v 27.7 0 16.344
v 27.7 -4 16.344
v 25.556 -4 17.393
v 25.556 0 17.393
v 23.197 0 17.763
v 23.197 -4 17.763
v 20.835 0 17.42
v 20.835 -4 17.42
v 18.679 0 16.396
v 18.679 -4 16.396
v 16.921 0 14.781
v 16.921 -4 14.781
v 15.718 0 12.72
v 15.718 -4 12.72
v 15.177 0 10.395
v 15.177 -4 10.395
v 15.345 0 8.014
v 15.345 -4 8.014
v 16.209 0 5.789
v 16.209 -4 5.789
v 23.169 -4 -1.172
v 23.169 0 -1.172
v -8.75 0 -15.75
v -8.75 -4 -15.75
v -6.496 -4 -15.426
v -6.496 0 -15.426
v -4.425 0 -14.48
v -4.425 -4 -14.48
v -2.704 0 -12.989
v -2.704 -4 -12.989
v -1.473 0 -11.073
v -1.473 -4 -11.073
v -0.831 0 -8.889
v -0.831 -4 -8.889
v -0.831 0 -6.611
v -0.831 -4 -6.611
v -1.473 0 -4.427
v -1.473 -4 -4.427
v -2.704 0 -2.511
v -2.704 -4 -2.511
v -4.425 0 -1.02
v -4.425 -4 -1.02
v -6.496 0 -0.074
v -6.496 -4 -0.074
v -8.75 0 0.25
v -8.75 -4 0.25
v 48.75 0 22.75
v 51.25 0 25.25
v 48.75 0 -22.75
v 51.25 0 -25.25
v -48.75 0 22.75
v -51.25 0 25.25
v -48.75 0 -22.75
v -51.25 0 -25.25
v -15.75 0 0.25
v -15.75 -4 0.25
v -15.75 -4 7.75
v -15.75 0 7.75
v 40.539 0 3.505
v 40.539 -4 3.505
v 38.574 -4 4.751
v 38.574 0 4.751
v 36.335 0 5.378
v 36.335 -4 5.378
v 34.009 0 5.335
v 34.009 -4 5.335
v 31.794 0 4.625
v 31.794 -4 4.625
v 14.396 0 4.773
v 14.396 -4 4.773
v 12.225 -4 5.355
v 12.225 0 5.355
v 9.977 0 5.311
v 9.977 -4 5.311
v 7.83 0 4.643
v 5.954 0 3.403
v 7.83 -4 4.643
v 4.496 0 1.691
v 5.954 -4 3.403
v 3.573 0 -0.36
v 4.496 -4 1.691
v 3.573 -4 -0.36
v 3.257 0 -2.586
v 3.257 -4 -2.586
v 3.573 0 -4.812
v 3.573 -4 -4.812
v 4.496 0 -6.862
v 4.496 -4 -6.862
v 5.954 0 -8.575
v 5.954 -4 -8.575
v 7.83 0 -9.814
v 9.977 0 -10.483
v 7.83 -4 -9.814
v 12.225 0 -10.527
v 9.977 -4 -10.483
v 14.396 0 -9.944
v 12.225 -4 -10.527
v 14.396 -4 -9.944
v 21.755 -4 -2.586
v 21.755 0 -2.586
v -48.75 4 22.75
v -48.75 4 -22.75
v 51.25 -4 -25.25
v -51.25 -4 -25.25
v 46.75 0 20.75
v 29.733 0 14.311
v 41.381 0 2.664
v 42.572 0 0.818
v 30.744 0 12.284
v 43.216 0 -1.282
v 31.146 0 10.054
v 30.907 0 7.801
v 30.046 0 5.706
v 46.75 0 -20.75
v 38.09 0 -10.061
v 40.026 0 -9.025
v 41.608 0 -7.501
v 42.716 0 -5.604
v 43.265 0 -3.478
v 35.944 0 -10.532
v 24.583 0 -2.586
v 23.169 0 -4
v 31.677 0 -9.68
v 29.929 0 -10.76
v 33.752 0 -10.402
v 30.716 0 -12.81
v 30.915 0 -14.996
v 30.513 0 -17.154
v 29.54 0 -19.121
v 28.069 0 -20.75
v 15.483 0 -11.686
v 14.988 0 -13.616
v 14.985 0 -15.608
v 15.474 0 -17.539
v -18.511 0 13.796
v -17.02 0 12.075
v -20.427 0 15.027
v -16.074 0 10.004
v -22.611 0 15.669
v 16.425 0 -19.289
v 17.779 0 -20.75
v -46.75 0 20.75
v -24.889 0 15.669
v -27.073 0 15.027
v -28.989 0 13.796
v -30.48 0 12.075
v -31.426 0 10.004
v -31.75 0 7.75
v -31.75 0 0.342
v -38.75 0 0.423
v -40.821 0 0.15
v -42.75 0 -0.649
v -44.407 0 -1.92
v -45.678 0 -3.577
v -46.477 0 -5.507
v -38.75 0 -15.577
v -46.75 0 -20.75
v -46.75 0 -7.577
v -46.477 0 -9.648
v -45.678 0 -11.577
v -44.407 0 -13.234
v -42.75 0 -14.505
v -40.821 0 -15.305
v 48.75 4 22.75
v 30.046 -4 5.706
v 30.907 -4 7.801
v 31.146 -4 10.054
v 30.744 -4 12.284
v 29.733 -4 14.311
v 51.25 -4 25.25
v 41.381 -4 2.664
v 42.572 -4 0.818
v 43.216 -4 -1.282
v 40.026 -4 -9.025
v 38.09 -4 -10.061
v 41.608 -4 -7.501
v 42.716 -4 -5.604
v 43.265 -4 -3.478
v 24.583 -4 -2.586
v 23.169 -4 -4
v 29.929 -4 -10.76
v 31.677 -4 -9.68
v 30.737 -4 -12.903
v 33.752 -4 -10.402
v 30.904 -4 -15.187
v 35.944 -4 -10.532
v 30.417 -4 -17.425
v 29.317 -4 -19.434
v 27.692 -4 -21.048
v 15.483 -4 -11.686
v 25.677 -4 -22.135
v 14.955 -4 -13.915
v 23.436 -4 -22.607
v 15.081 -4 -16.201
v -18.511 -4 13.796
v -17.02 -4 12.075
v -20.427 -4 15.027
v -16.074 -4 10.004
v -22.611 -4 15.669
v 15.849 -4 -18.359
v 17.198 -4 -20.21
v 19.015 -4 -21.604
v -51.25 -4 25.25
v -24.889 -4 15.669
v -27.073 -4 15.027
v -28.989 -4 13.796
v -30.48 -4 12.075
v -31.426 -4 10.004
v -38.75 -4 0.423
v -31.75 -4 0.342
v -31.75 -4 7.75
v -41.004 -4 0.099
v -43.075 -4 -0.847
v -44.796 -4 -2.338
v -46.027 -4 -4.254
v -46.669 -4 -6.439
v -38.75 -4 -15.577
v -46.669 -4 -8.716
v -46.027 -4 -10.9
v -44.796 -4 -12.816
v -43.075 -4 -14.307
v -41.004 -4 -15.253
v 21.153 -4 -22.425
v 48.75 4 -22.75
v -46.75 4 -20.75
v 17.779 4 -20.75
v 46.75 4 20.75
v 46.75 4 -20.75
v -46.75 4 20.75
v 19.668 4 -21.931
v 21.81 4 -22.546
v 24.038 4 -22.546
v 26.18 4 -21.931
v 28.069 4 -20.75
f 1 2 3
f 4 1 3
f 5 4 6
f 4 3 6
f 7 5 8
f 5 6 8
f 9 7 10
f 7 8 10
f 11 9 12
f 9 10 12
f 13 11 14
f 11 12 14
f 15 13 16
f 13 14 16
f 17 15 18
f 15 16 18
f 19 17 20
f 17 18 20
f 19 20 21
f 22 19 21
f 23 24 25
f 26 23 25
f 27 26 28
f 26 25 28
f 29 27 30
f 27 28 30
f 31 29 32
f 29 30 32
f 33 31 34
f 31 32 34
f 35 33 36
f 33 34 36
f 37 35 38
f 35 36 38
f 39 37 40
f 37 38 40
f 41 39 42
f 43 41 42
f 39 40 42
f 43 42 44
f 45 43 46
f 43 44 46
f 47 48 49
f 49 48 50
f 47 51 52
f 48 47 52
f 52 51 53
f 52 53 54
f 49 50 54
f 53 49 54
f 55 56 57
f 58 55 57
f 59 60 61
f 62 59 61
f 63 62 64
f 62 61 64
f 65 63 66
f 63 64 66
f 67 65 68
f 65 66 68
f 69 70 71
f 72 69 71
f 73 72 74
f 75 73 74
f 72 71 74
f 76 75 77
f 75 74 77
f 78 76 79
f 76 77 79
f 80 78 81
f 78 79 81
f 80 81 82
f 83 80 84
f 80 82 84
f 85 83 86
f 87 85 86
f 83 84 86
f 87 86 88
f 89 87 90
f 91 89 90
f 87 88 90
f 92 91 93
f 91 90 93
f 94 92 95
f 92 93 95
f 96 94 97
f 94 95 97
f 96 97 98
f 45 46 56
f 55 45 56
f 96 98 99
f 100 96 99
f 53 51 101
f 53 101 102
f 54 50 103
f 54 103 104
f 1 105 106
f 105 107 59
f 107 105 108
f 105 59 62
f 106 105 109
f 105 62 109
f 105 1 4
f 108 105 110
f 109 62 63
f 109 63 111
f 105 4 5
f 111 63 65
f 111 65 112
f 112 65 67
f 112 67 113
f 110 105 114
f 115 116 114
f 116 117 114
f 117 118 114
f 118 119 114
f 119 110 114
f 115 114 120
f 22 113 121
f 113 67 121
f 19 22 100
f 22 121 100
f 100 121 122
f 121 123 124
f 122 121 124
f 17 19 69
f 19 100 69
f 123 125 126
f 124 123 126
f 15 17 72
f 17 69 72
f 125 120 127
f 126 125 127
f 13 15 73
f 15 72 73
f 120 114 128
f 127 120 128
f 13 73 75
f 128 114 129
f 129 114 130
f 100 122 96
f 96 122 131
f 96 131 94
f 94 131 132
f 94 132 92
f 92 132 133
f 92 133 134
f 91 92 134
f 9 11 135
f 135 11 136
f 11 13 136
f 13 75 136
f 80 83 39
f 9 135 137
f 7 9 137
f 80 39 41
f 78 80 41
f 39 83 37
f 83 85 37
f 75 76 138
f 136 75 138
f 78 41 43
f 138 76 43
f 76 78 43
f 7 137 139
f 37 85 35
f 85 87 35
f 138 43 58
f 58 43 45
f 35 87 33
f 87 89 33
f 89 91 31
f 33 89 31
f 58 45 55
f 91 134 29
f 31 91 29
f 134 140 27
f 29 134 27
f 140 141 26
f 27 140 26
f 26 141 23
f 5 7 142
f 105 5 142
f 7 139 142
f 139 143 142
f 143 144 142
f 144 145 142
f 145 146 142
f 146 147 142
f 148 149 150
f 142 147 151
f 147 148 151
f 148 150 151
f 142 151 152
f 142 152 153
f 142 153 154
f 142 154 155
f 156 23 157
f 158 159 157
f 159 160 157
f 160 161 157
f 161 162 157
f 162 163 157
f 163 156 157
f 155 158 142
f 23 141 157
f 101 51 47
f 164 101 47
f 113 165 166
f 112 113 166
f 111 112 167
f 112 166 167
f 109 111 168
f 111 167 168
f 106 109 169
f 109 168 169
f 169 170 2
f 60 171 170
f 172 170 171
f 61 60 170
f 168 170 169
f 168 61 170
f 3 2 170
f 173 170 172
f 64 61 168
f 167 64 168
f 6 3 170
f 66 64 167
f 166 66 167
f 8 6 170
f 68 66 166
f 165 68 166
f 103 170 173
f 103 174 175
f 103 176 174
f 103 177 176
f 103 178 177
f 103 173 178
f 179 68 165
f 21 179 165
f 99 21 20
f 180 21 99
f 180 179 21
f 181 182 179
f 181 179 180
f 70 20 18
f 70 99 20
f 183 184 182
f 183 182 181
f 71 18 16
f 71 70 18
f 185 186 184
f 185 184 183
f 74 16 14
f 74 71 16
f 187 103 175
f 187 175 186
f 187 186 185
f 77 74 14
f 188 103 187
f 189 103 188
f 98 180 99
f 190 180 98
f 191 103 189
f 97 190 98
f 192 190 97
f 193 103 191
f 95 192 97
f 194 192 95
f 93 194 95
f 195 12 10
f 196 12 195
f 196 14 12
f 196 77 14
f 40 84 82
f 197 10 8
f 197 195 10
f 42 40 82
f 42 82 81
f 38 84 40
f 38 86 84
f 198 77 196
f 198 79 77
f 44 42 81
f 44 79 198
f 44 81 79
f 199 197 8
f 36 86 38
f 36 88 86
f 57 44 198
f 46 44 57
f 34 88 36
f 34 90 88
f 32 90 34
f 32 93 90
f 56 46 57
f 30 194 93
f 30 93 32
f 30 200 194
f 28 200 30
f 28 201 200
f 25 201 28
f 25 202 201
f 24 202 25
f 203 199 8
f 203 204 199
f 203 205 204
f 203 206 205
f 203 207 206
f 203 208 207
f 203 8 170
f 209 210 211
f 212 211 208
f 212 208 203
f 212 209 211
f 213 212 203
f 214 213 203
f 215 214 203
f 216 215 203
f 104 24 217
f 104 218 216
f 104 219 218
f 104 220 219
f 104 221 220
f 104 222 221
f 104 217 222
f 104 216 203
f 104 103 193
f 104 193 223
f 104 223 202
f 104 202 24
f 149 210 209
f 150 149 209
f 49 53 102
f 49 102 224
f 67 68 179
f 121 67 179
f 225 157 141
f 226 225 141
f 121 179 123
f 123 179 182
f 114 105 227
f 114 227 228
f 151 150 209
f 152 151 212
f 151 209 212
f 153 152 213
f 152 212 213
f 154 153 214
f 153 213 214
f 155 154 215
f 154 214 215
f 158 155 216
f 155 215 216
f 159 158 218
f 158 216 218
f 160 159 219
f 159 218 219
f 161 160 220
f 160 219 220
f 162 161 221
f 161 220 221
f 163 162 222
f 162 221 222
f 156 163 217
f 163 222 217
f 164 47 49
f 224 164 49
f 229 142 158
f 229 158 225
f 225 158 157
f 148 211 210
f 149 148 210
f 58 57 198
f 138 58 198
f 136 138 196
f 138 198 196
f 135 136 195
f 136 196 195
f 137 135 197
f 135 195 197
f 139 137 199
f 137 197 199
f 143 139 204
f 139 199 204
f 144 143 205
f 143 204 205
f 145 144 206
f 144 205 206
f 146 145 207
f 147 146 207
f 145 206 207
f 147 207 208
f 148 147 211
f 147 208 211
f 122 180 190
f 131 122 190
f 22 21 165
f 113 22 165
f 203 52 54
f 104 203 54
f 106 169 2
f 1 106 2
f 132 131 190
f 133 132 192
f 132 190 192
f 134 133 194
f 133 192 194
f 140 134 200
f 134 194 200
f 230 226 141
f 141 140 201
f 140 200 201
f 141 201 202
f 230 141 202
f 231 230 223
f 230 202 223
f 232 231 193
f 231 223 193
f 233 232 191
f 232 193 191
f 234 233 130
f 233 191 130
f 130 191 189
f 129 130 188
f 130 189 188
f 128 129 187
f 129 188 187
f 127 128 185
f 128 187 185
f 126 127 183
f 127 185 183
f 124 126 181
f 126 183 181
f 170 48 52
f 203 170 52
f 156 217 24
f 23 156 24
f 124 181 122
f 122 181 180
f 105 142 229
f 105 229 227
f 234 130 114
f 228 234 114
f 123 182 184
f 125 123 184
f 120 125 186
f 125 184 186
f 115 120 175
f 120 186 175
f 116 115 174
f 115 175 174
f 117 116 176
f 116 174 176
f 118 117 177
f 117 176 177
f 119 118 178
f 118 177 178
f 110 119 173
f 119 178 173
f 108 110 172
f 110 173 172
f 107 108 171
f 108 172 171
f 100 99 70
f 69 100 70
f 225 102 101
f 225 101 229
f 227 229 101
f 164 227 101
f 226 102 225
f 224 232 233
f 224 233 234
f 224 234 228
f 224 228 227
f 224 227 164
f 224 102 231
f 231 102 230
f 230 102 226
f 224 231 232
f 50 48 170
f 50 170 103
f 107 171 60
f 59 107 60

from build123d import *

# Parameters (mm, degrees)
SKETCH1_W           = 97.5
SKETCH1_H           = 45.5
SKETCH1_W_2         = 93.5
SKETCH1_H_2         = 41.5
BOSS_EXTRUDE1_DEPTH = 4
SKETCH2_W           = 102.5
SKETCH2_H           = 50.5
BOSS_EXTRUDE2_DEPTH = 4
CUT_EXTRUDE1_DEPTH  = 58.689903796


with BuildPart() as part:
    # Sketch1 → Boss-Extrude1 (new body)
    with BuildSketch(Plane(origin=(0, 0, 0), x_dir=(1, 0, 0), z_dir=(0, 1, 0))):
        Rectangle(SKETCH1_W, SKETCH1_H)
        Rectangle(SKETCH1_W_2, SKETCH1_H_2, mode=Mode.SUBTRACT)
    extrude(amount=BOSS_EXTRUDE1_DEPTH)

    # Sketch2 → Boss-Extrude2 (add)
    with BuildSketch(Plane(origin=(0, 0, 0), x_dir=(-1, 0, 0), z_dir=(0, -1, 0))):
        Rectangle(SKETCH2_W, SKETCH2_H)
    extrude(amount=BOSS_EXTRUDE2_DEPTH)

    # Sketch3 → Cut-Extrude1 (cut, through all)
    with BuildSketch(Plane.XZ.offset(4)):
        with BuildLine():
            Line((21.754778505, -2.585841929), (14.396321324, 4.772615252))
            ThreePointArc((14.396321324, 4.772615252), (3.257355265, -2.585841929), (14.396321324, -9.94429911))
            Line((14.396321324, -9.94429911), (21.754778505, -2.585841929))
        make_face()
        with BuildLine():
            ThreePointArc((27.699814048, 16.344452811), (17.739587878, 15.654593104), (16.208809841, 5.78855386))
            Line((16.208809841, 5.78855386), (23.168992067, -1.171628366))
            Line((23.168992067, -1.171628366), (30.046481727, 5.705861294))
            ThreePointArc((30.046481727, 5.705861294), (31.14634131, 10.054344559), (29.732993239, 14.31127362))
            Line((29.732993239, 14.31127362), (27.699814048, 16.344452811))
        make_face()
        with BuildLine():
            ThreePointArc((15.482875978, -11.68617158), (23.435669898, -22.607420615), (29.929242502, -10.760305926))
            Line((29.929242502, -10.760305926), (23.168992067, -4.000055491))
            Line((23.168992067, -4.000055491), (15.482875978, -11.68617158))
        make_face()
        with BuildLine():
            ThreePointArc((40.538950668, 3.505316191), (36.33465085, 5.37848968), (31.79403897, 4.624991411))
            Line((31.79403897, 4.624991411), (24.58320563, -2.585841929))
            Line((24.58320563, -2.585841929), (31.677379035, -9.680015334))
            ThreePointArc((31.677379035, -9.680015334), (41.608009289, -7.500810005), (41.380693911, 2.663572949))
            Line((41.380693911, 2.663572949), (40.538950668, 3.505316191))
        make_face()
        with BuildLine():
            Line((-31.75, 0.342207976), (-38.75, 0.422889955))
            ThreePointArc((-38.75, 0.422889955), (-46.75, -7.577110045), (-38.75, -15.577110045))
            Line((-38.75, -15.577110045), (-8.75, -15.75))
            ThreePointArc((-8.75, -15.75), (-0.75, -7.75), (-8.75, 0.25))
            Line((-8.75, 0.25), (-15.75, 0.25))
            Line((-15.75, 0.25), (-15.75, 7.75))
            ThreePointArc((-15.75, 7.75), (-23.75, 15.75), (-31.75, 7.75))
            Line((-31.75, 7.75), (-31.75, 0.342207976))
        make_face()
    extrude(amount=-CUT_EXTRUDE1_DEPTH, mode=Mode.SUBTRACT)


solid = part.part
